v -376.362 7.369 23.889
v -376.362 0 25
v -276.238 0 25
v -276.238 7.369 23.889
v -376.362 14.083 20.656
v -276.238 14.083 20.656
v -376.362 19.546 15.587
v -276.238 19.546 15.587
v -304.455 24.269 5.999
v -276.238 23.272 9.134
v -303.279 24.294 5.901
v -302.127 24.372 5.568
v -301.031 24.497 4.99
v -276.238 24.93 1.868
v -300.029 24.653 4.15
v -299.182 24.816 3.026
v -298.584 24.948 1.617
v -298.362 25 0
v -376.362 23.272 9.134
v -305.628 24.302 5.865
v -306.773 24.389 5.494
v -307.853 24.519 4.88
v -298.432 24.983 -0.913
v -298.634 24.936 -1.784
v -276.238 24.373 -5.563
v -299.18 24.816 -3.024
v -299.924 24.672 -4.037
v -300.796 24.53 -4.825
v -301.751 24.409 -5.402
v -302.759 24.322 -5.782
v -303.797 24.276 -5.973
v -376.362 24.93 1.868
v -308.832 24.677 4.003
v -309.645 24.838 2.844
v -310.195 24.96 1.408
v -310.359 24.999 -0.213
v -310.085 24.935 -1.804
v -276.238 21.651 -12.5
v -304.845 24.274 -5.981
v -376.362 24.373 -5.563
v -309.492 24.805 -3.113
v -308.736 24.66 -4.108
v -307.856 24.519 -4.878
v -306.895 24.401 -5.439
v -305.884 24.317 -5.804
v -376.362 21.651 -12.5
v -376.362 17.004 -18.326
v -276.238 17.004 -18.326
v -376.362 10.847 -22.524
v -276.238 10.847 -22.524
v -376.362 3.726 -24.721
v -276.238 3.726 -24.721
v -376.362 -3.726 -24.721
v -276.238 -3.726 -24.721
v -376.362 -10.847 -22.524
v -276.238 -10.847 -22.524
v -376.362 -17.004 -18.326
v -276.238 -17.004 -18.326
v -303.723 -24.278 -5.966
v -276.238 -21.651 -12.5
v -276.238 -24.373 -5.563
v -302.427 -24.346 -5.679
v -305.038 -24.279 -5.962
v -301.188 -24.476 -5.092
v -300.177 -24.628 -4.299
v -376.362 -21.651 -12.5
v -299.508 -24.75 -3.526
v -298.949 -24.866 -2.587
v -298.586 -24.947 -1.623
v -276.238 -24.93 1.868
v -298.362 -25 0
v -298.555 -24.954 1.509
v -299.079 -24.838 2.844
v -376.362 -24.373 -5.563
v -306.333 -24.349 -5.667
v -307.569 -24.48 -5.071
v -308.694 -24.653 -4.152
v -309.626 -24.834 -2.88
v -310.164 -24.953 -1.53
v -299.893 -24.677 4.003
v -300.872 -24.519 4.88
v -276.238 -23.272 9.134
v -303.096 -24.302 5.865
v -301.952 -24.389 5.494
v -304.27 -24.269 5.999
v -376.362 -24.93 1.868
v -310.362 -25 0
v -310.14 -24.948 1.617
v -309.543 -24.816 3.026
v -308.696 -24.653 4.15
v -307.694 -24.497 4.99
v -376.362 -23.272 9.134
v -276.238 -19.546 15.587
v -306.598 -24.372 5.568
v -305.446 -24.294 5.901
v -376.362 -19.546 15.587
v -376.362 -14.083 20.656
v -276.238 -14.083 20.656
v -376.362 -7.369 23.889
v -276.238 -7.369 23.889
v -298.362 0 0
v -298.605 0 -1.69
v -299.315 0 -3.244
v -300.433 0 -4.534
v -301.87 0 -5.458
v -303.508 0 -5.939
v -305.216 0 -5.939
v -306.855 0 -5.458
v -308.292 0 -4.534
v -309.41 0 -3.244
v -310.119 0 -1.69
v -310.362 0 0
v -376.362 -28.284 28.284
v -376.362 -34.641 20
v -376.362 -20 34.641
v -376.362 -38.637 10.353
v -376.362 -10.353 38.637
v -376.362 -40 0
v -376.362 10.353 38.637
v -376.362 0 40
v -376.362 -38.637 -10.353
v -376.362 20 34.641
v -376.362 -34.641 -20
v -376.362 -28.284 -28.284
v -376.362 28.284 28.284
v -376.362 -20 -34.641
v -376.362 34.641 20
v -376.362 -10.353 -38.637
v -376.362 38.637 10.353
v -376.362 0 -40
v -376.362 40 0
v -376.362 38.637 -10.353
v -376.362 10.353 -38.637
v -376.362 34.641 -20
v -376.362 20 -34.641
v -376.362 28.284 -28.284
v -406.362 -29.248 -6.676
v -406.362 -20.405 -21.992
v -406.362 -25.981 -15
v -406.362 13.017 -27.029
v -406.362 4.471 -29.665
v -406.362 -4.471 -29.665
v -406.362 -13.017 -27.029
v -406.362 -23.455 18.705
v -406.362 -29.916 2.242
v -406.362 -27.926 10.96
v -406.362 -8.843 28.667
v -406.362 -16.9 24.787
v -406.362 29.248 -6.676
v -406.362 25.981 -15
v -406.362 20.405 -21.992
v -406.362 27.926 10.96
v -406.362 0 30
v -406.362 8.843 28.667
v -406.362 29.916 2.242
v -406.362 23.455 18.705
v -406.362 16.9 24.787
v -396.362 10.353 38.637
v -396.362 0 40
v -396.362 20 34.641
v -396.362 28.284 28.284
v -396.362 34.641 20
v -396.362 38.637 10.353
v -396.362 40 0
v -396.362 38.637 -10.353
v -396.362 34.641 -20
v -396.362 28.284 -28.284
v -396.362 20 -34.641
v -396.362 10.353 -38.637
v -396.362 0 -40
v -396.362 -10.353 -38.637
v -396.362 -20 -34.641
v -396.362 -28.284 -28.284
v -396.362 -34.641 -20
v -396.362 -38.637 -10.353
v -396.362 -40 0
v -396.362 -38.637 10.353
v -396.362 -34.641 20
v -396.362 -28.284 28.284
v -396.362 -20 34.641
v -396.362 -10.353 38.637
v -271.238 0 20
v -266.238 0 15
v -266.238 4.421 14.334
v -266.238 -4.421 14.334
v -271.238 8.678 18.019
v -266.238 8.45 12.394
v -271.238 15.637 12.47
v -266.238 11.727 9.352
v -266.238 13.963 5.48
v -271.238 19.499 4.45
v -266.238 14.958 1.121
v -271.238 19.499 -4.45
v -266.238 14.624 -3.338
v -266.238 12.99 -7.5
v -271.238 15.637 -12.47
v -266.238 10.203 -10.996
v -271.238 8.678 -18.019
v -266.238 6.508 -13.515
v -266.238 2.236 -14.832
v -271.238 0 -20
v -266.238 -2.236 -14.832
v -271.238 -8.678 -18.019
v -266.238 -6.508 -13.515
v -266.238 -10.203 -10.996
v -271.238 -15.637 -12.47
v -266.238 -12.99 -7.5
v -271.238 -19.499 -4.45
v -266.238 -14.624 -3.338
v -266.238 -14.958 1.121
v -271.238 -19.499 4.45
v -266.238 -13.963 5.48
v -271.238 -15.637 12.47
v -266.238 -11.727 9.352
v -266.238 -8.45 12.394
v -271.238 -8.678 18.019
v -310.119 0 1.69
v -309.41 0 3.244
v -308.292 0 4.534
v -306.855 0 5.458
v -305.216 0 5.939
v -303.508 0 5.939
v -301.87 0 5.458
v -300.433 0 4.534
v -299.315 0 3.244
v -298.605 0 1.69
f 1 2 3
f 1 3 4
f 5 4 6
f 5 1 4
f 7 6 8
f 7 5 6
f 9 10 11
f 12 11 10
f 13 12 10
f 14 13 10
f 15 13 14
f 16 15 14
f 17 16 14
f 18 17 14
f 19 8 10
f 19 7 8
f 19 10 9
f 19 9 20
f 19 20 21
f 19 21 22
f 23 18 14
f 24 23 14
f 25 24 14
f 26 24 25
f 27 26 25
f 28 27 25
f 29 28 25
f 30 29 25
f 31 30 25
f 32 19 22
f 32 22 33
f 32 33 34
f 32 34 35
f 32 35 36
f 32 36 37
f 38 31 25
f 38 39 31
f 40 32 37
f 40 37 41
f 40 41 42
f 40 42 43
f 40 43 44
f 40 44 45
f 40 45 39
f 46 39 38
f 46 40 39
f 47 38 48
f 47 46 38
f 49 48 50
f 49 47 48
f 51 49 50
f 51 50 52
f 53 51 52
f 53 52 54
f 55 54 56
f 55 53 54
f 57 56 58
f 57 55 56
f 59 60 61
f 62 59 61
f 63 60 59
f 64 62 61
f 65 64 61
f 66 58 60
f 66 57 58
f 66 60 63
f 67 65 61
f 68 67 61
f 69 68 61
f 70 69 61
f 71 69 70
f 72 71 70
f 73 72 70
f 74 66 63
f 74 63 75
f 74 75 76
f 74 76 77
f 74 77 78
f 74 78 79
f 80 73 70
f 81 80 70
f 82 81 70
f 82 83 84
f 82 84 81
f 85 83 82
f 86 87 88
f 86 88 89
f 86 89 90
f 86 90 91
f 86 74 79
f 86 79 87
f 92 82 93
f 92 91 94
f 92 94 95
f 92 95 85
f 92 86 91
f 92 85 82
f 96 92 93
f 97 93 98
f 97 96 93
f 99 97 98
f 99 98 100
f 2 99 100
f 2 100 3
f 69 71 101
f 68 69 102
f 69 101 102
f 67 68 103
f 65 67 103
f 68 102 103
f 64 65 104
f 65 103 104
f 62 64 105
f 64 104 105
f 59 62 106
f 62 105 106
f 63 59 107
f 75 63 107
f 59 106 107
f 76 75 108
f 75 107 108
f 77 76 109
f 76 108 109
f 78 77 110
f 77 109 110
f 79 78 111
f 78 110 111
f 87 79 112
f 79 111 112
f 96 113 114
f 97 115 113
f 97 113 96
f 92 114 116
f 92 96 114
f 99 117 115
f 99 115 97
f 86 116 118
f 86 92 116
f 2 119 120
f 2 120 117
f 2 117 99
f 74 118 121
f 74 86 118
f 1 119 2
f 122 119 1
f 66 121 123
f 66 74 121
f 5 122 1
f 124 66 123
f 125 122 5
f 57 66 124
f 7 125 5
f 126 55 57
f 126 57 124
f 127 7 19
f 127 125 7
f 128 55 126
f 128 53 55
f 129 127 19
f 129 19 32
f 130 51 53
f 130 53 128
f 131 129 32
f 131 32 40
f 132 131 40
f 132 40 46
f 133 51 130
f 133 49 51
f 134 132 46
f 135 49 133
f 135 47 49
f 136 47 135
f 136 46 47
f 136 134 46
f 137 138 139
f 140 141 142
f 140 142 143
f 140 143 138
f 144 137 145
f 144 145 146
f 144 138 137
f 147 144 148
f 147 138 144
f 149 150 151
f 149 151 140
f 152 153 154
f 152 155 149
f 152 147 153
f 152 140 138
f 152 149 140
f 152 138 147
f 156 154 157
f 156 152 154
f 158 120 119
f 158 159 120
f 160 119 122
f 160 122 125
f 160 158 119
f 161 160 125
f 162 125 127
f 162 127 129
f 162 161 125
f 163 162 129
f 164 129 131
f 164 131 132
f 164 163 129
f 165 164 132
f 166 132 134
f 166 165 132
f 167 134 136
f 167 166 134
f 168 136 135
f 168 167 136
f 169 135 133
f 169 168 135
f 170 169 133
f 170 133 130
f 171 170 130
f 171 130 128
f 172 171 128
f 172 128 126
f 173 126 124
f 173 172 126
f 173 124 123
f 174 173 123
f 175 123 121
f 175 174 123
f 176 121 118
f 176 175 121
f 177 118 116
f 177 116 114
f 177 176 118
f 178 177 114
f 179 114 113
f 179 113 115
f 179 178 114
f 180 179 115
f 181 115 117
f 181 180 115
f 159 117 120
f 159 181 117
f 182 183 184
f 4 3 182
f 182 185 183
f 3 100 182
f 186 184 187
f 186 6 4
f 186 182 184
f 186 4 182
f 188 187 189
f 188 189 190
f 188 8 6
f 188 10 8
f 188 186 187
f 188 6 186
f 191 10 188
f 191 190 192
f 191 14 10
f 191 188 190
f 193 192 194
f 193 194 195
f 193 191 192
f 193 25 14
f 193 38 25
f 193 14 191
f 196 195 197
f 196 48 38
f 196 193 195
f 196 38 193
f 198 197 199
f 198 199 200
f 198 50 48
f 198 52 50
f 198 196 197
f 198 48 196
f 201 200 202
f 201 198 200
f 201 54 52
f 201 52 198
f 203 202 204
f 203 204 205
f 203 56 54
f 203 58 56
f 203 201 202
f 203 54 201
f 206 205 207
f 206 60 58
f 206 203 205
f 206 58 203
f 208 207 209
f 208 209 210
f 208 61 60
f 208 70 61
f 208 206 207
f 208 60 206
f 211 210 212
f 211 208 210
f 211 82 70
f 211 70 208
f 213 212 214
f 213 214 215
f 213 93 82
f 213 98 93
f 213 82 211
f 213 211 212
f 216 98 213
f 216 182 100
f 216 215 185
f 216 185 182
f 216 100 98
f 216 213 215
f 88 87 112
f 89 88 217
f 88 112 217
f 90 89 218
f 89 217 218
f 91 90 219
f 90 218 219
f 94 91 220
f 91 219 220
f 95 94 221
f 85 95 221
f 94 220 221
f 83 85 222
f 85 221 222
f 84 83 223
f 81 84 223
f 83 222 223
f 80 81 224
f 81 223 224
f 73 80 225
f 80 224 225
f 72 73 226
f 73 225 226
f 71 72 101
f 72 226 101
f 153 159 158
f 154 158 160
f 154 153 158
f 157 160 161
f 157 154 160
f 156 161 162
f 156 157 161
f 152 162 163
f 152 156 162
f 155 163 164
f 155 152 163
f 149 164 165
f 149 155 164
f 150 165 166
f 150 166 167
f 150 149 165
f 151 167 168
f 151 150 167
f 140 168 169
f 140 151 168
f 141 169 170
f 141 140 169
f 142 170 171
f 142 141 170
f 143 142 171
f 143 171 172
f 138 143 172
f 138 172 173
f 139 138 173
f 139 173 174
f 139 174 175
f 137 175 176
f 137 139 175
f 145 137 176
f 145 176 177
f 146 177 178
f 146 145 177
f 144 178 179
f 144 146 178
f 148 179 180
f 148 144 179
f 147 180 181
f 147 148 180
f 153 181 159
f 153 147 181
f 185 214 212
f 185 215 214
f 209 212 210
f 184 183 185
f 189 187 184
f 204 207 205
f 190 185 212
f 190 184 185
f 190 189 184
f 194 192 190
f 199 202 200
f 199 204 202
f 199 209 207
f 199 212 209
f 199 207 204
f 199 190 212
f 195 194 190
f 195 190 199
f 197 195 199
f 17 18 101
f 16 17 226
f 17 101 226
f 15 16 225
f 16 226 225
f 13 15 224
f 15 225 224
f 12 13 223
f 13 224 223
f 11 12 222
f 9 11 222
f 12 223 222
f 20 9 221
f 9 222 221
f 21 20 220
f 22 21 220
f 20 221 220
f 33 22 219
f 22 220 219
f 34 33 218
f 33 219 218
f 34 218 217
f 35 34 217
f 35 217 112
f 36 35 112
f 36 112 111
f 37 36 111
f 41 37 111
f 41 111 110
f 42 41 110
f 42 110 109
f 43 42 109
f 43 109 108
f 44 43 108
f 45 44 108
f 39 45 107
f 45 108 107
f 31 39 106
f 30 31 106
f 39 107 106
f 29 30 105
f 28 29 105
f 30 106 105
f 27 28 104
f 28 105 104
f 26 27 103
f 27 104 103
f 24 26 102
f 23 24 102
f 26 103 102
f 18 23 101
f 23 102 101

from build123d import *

# Parameters (mm, degrees)
F2_R     = 6
F3_DEPTH = 40.001
F4_R     = 6
F5_DEPTH = 40.001
F6_DEPTH = 40.001


with BuildPart() as f1:
    # F0 (on Front) → F1 (revolve)
    with BuildSketch(Plane.XZ):
        Polygon((-406.362363, 30), (-406.362363, 0), (-312.251694, 0), (-296.473032, 0), (-266.237753, 0), (-266.237753, 15), (-276.237753, 25), (-376.362363, 25), (-376.362363, 40), (-396.362363, 40), align=None)
    revolve(axis=Axis((-281.355392, 0, 0), (-1, 0, 0)))

    # F2 (on Front) → F3 (cut, through all)
    with BuildSketch(Plane.XZ):
        with Locations((-304.362363, 0)):
            Circle(F2_R)
    extrude(amount=-F3_DEPTH, mode=Mode.SUBTRACT)

    # F4 (on face) → F5 (cut, through all)
    with BuildSketch(Plane(origin=(0, 0, 0), x_dir=(-1, 0, 0), z_dir=(0, 1, 0))):
        with Locations((304.362363, 0)):
            Circle(F4_R)
    extrude(amount=-F5_DEPTH, mode=Mode.SUBTRACT)

    # F2 (on Front) → F6 (cut, through all)
    with BuildSketch(Plane.XZ):
        with Locations((-304.362363, 0)):
            Circle(F2_R)
    extrude(amount=F6_DEPTH, mode=Mode.SUBTRACT)


solid = f1.part
